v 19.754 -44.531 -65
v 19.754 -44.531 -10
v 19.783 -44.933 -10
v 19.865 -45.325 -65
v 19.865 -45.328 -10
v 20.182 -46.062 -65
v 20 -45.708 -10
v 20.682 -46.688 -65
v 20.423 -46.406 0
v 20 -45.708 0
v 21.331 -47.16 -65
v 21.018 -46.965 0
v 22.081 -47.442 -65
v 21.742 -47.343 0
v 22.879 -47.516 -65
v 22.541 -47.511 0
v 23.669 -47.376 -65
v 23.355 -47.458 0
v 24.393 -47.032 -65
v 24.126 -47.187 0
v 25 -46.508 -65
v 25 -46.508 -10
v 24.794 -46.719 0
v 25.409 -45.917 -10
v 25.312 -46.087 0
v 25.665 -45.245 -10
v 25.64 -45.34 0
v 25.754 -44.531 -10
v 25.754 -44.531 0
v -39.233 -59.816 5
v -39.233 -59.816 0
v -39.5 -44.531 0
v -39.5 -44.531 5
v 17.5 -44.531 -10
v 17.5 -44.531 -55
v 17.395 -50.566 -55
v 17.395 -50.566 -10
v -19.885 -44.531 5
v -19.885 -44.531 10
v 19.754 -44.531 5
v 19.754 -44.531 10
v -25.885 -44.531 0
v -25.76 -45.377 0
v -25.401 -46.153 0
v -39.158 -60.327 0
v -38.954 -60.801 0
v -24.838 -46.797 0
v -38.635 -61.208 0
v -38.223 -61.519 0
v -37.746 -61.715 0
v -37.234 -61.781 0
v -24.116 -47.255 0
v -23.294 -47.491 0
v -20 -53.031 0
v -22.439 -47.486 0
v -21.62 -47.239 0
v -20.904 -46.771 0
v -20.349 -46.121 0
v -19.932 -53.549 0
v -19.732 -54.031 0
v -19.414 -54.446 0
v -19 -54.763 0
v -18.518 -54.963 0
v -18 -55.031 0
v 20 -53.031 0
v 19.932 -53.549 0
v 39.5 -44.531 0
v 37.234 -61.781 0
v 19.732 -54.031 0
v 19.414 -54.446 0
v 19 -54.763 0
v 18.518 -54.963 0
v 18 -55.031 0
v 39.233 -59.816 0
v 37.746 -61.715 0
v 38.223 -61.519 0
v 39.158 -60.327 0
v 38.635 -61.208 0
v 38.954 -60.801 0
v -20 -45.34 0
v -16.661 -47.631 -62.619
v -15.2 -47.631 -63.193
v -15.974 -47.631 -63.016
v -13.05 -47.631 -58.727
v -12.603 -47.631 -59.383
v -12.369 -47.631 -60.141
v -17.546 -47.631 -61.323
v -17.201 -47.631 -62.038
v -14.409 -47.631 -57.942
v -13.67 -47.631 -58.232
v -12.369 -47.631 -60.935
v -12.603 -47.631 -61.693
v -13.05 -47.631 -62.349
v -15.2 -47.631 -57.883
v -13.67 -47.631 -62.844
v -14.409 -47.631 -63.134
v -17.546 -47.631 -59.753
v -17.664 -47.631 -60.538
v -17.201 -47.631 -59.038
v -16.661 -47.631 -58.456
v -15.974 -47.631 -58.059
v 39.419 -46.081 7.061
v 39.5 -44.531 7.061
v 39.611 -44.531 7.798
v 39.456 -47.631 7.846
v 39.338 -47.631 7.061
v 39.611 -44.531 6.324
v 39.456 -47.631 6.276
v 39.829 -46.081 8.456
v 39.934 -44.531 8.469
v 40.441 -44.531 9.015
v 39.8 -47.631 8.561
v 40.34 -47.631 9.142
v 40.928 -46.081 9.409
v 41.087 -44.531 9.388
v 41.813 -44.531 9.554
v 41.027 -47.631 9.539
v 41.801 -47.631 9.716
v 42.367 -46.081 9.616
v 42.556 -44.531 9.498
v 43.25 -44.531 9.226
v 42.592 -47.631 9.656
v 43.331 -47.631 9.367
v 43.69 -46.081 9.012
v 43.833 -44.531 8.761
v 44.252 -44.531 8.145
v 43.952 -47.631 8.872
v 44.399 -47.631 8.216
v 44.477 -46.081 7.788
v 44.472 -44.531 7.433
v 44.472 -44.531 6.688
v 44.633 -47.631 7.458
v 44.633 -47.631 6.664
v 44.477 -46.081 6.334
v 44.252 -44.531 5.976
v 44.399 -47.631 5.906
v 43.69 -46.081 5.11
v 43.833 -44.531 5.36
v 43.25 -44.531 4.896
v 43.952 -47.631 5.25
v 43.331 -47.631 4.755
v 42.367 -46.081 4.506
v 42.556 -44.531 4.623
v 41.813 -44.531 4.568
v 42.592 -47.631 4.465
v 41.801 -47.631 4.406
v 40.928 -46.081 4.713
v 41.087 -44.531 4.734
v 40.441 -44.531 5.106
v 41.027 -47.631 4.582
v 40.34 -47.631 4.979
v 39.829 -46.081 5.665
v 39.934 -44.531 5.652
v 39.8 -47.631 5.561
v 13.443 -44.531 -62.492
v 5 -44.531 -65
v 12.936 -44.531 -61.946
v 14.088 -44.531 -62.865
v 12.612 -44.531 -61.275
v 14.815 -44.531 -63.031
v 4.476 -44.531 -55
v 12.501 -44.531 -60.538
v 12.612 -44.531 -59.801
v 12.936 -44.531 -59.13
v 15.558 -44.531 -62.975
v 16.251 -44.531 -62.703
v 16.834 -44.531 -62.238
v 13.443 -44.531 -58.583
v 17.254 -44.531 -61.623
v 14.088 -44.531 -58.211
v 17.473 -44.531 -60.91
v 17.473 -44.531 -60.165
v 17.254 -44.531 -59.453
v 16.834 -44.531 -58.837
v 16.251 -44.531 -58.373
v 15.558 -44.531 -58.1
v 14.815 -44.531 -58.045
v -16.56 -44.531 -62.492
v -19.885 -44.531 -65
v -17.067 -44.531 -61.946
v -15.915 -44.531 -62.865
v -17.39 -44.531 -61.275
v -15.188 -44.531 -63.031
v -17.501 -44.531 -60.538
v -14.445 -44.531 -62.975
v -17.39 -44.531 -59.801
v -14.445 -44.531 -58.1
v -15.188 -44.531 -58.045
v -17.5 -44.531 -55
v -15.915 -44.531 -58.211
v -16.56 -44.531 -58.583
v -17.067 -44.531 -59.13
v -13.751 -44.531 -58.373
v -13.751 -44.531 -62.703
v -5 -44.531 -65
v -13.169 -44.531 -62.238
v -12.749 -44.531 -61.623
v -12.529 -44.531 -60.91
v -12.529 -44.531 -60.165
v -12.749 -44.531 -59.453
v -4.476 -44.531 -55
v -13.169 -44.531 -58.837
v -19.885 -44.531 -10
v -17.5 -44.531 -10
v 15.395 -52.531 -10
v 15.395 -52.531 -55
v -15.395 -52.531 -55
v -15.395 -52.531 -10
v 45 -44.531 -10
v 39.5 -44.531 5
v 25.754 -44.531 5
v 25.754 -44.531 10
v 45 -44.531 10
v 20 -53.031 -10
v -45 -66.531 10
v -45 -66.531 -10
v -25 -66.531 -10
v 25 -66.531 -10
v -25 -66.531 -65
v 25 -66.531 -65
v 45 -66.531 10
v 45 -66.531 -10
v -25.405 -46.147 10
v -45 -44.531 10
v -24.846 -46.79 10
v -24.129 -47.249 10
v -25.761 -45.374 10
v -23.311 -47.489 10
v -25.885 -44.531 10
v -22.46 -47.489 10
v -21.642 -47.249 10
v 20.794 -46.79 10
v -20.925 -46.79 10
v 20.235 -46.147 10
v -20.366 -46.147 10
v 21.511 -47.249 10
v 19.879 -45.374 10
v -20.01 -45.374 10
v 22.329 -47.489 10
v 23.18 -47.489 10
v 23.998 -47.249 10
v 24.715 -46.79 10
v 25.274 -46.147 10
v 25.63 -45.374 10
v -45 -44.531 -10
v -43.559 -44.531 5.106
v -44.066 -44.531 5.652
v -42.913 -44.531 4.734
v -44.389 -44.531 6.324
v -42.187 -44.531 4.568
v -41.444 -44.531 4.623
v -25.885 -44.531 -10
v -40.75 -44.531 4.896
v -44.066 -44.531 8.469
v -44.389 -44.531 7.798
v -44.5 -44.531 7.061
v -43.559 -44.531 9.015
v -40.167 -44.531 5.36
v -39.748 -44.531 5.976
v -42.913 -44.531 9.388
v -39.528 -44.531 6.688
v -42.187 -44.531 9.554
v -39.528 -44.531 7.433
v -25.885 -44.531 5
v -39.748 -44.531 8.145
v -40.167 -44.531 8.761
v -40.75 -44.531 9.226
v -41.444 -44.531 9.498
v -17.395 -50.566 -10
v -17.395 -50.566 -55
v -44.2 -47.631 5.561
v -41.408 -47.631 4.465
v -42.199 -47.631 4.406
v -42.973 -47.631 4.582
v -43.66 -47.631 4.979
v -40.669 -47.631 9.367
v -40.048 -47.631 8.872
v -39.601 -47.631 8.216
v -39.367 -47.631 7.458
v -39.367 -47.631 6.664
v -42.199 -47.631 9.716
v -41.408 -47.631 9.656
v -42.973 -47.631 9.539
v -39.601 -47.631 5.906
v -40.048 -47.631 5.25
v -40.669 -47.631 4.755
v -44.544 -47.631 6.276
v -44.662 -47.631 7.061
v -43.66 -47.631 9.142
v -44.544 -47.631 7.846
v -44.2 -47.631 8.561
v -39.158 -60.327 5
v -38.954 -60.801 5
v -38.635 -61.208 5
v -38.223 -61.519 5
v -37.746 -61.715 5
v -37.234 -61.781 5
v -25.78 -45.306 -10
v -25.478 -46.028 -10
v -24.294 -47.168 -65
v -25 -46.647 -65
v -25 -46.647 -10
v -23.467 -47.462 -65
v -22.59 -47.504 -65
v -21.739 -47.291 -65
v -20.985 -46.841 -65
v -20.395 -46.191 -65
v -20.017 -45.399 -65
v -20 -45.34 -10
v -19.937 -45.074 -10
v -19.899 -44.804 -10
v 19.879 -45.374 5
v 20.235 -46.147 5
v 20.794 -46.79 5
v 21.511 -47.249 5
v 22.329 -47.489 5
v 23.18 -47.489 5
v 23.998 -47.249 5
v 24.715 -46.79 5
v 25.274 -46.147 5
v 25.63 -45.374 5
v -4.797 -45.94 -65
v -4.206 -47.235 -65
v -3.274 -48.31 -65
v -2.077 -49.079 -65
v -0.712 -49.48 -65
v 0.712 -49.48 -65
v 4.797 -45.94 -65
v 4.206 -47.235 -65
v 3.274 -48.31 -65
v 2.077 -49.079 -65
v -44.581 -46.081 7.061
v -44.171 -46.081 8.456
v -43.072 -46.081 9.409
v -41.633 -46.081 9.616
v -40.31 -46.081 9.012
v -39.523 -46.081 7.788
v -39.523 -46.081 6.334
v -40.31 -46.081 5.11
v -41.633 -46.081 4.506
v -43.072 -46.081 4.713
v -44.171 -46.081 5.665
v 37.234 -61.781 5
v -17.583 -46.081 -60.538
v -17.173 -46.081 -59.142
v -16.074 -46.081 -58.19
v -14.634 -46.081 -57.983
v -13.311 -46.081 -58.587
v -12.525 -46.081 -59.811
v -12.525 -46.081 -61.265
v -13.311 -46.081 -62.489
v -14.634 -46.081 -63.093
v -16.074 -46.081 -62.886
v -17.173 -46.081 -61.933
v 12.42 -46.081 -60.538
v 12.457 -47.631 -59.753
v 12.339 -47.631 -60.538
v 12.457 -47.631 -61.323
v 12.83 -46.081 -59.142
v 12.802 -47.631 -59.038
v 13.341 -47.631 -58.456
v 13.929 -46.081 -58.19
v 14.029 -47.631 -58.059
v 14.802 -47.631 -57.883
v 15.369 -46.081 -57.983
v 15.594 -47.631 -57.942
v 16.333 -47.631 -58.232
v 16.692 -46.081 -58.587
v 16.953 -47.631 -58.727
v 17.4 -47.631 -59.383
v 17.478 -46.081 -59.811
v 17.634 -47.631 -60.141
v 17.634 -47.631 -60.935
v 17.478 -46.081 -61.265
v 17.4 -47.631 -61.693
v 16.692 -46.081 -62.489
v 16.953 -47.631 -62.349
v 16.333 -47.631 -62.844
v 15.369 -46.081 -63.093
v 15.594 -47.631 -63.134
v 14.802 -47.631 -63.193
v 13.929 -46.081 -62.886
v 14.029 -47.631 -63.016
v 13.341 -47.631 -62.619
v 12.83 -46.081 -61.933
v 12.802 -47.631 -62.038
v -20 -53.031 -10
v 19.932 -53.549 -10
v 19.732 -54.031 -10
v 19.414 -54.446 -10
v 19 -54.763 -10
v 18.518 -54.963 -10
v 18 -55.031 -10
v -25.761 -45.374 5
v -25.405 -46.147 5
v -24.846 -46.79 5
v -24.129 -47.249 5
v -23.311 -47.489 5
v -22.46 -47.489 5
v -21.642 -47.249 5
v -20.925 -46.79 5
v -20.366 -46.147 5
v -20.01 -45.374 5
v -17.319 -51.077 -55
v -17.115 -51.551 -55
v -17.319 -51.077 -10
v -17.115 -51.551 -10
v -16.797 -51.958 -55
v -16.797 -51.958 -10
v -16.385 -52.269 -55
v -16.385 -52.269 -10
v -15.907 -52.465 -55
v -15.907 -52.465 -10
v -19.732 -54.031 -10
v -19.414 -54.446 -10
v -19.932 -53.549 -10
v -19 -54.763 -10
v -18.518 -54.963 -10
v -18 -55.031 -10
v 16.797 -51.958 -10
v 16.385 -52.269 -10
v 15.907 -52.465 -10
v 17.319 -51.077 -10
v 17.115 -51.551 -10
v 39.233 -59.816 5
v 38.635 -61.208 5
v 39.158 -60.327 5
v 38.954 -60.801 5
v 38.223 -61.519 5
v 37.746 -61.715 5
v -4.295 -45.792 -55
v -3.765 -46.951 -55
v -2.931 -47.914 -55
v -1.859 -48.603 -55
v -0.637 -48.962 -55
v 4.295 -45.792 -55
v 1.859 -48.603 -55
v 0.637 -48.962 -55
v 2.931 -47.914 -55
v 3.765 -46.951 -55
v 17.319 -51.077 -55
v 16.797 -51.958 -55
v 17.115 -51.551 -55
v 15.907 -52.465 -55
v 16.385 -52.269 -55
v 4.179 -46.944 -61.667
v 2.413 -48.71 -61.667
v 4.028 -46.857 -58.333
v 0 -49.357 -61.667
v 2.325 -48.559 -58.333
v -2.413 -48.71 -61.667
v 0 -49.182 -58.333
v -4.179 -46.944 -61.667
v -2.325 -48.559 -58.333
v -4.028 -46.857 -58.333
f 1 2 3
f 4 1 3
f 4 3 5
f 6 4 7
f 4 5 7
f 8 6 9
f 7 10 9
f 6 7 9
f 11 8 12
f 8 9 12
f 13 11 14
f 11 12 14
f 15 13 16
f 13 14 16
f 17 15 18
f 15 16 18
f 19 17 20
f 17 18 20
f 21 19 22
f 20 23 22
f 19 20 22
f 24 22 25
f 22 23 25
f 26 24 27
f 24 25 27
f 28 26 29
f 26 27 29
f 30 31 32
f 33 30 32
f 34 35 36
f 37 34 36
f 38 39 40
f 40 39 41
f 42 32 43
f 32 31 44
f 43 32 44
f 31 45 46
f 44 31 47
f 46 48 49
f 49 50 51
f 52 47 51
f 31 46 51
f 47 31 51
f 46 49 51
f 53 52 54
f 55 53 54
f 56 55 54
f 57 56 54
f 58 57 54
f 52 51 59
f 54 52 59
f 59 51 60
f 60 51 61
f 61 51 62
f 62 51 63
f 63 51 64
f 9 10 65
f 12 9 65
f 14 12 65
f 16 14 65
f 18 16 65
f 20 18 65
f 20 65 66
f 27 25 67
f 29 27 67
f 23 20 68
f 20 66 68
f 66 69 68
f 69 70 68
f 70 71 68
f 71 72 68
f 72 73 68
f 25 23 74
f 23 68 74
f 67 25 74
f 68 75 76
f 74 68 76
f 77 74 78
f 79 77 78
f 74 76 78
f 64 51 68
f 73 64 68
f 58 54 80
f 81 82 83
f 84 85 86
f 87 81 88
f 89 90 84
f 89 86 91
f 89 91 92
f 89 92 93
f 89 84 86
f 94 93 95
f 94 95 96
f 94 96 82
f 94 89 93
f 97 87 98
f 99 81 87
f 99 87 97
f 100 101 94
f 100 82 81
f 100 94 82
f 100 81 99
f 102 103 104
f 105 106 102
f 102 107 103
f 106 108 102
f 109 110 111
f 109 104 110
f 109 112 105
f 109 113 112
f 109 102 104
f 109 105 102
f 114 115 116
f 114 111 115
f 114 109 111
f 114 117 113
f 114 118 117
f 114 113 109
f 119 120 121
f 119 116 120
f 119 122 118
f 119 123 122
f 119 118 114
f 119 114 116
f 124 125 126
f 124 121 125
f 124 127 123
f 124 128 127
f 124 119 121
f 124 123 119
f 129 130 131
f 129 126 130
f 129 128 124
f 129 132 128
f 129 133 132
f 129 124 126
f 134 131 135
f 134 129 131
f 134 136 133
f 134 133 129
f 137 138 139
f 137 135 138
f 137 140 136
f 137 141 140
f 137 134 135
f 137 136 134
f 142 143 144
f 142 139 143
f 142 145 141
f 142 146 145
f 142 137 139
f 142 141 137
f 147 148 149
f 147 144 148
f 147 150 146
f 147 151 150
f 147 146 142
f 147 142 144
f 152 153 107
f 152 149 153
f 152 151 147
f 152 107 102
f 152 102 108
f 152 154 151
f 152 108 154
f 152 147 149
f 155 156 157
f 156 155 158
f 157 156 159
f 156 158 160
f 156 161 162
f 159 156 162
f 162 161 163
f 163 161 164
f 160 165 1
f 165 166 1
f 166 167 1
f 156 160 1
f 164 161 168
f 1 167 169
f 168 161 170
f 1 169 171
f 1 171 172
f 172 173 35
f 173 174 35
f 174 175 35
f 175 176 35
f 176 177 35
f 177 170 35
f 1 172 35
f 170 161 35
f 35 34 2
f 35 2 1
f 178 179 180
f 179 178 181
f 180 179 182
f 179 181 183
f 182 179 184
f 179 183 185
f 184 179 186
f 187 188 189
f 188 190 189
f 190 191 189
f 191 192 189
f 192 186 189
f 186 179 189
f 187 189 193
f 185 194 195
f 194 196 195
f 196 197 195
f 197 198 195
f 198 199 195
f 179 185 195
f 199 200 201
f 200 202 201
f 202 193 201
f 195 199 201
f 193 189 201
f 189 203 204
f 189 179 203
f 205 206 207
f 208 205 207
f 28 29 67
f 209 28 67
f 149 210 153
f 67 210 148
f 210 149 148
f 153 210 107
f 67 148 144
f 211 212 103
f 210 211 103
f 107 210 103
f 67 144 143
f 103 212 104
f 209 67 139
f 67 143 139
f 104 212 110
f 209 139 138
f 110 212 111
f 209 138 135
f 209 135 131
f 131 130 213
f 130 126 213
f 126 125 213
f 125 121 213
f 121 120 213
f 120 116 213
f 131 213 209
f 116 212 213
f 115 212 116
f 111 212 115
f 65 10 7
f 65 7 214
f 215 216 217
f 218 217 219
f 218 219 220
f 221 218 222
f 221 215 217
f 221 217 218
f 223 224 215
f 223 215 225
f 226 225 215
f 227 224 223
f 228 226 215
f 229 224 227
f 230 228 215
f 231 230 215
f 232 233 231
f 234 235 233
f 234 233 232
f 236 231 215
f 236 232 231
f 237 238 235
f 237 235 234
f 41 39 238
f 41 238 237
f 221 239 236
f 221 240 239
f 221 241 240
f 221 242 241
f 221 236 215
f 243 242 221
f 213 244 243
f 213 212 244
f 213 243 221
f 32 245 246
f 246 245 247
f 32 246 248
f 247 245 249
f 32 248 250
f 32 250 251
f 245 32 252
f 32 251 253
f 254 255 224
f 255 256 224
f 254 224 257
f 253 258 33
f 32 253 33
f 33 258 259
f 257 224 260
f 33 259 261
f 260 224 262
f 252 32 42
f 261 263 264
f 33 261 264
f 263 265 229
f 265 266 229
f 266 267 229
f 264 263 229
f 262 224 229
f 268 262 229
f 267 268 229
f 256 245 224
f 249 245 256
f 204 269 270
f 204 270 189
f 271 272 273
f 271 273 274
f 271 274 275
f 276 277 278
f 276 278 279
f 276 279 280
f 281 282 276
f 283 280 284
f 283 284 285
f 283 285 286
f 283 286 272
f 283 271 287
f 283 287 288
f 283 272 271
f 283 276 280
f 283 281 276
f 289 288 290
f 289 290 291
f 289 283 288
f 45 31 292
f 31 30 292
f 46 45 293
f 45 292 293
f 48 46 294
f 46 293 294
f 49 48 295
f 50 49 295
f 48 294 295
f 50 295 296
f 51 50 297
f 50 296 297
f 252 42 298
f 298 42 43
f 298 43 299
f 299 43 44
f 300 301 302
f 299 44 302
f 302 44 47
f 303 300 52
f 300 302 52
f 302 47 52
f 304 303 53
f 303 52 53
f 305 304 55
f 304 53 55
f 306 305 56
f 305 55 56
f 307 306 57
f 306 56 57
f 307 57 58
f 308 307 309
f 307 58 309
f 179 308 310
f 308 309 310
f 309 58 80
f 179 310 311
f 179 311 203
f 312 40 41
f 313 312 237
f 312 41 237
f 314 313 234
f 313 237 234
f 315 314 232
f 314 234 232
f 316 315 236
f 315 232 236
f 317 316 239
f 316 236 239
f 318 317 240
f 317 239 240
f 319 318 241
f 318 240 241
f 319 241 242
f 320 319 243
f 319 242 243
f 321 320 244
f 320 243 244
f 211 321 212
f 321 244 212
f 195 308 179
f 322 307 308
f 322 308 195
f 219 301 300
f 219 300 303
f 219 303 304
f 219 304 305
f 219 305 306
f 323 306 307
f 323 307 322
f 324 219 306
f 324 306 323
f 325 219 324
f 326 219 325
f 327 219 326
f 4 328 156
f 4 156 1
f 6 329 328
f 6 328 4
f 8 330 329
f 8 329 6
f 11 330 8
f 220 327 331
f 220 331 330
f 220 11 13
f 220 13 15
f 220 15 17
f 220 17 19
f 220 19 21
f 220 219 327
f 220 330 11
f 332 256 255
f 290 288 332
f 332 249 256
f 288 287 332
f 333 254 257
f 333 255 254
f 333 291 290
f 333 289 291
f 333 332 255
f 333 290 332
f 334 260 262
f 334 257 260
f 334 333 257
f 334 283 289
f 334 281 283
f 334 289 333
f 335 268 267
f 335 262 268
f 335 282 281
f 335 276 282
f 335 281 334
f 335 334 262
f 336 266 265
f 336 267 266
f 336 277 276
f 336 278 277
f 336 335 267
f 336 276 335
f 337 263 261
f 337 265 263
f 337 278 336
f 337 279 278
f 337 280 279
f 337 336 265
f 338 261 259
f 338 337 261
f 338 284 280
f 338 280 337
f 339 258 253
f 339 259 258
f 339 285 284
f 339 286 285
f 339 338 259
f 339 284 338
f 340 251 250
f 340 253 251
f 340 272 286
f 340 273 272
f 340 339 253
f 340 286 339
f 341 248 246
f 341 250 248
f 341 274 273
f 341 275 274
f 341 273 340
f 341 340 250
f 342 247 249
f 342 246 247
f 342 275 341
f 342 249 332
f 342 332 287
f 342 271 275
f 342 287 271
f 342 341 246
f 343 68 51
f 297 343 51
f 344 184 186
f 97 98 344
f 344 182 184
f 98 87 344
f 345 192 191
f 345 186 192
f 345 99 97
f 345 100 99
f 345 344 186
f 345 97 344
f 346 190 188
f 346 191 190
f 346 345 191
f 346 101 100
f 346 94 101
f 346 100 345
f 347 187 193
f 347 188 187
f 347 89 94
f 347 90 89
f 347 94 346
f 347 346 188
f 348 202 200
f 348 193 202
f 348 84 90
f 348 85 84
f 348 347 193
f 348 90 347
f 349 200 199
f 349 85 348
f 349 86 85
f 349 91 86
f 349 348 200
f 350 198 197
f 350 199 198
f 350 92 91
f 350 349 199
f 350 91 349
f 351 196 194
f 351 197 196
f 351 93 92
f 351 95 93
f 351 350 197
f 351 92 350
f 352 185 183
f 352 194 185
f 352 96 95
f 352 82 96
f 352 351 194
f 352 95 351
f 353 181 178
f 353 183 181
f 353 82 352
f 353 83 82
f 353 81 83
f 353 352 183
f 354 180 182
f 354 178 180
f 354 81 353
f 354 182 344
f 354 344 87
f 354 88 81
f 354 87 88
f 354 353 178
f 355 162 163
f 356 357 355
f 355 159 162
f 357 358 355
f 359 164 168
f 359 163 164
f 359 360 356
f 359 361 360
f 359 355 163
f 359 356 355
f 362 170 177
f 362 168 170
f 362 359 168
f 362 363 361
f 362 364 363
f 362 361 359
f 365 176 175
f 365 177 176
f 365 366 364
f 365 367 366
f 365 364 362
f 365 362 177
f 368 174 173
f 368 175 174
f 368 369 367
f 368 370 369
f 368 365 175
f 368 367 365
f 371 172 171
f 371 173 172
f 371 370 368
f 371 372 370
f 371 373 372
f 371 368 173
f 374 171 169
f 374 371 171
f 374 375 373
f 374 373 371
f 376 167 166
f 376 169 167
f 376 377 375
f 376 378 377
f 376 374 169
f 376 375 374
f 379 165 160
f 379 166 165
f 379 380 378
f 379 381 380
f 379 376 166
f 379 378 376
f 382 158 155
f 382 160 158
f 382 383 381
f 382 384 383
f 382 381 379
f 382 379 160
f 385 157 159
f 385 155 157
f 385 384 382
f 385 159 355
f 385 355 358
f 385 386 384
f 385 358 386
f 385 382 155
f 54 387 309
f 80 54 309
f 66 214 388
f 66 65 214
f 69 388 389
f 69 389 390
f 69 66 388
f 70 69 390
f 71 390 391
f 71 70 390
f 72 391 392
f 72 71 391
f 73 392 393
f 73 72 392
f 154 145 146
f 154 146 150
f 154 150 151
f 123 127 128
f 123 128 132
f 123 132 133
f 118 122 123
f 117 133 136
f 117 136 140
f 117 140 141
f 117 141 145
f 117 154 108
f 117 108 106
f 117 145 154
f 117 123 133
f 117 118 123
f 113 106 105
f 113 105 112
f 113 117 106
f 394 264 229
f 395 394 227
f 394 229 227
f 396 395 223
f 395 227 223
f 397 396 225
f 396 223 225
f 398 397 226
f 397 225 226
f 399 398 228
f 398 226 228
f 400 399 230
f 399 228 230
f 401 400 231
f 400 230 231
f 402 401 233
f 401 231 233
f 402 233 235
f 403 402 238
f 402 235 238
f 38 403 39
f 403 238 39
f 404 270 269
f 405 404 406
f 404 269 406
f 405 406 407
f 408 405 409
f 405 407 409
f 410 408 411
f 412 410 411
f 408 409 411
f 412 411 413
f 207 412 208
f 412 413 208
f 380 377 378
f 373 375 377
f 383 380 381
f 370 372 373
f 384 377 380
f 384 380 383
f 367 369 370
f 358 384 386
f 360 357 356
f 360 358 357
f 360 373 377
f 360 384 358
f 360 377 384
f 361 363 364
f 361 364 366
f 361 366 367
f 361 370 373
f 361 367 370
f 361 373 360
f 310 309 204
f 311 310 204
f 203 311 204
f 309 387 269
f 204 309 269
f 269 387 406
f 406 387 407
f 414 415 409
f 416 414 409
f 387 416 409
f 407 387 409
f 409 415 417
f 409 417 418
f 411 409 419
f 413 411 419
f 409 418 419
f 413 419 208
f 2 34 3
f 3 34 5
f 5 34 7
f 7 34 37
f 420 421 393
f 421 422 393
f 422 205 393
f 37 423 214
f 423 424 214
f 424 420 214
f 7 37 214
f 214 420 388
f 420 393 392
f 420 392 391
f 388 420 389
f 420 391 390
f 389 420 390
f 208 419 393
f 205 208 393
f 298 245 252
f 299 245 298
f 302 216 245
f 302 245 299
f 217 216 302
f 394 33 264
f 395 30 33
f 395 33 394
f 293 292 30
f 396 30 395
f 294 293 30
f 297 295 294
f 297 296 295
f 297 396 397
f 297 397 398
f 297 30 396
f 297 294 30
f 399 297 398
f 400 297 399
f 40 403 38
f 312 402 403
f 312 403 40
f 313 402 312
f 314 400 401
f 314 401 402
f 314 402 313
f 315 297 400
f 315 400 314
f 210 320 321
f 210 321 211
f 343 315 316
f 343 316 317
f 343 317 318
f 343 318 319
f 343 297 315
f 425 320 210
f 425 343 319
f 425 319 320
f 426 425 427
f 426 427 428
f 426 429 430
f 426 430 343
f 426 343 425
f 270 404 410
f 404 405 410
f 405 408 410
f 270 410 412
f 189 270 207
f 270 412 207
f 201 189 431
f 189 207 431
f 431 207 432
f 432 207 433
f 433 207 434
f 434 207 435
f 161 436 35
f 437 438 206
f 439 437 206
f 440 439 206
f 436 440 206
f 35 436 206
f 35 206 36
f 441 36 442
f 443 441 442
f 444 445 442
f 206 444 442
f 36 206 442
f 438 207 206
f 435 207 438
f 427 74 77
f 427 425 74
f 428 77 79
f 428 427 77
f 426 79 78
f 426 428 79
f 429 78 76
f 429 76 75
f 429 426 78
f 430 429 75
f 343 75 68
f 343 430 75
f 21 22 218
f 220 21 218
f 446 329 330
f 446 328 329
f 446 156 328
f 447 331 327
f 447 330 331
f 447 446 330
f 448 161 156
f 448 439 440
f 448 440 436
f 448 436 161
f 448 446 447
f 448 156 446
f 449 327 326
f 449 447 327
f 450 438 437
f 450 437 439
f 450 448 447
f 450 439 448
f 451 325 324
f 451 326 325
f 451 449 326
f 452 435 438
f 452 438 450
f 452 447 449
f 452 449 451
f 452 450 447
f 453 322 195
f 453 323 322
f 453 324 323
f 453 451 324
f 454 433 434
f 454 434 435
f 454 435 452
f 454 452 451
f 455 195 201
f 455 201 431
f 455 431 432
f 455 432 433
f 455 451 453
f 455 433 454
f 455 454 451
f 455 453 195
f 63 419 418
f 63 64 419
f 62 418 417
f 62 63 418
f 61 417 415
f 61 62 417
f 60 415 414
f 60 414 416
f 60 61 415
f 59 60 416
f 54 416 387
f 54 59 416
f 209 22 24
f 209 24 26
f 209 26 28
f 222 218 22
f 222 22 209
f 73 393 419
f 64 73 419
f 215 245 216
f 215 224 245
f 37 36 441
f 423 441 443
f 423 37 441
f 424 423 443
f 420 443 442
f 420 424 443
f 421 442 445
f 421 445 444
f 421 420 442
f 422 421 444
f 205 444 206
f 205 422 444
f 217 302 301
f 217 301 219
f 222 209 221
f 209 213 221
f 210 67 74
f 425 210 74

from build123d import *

# Parameters (mm, degrees)
F0_W      = 90
F0_H      = 22
F1_DEPTH  = 10
F3_DEPTH  = 5
F4_R      = 2
F5_W      = 90
F5_H      = 22
F6_DEPTH  = 10
F8_DEPTH  = 10
F9_R      = 2
F11_DEPTH = 45
F13_DEPTH = 45
F14_R     = 2
F15_W     = 50
F15_H     = 22
F16_DEPTH = 10
F17_R     = 5
F18_DEPTH = 25
F18_TAPER = 3
F20_R     = 3
F21_DEPTH = 90
F22_R     = 2.5
F23_DEPTH = 3.1
F23_TAPER = -3
F24_R     = 2.5
F25_DEPTH = 3.1
F25_TAPER = -3


with BuildPart() as f1:
    # F0 (on Top) → F1 (new body)
    with BuildSketch(Plane.XY):
        with Locations((0, -55.5313304067)):
            Rectangle(F0_W, F0_H)
    extrude(amount=F1_DEPTH)

    # F2 (on face) → F3 (cut)
    with BuildSketch(Plane(origin=(0, 0, 0), x_dir=(1, 0, 0), z_dir=(0, 0, -1))):
        Polygon((-39.5, 44.5313304067), (0, 44.5313304067), (39.5, 44.5313304067), (39.19890013, 61.7813304067), (-39.19890013, 61.7813304067), align=None)
    extrude(amount=-F3_DEPTH, mode=Mode.SUBTRACT)

    # F4
    f4_edges = [f1.edges().sort_by_distance(p)[0] for p in [
        (-39.1989, -61.78133, 2.5),
        (39.1989, -61.78133, 2.5),
    ]]
    fillet(f4_edges, radius=F4_R)

    # F5 (on face) → F6 (join)
    with BuildSketch(Plane(origin=(0, 0, 0), x_dir=(1, 0, 0), z_dir=(0, 0, -1))):
        with Locations((0, 55.5313304067)):
            Rectangle(F5_W, F5_H)
    extrude(amount=F6_DEPTH)

    # F7 (on face) → F8 (cut)
    with BuildSketch(Plane(origin=(0, 0, -10), x_dir=(1, 0, 0), z_dir=(0, 0, -1))):
        Polygon((-20, 44.5313304067), (0, 44.5313304067), (20, 44.5313304067), (19.8167218183, 55.0313304067), (-19.8167218183, 55.0313304067), align=None)
        Polygon((19.8167218183, 55.0313304067), (20, 44.5313304067), (20, 55.0313304067), align=None)
        Polygon((-20, 55.0313304067), (-20, 44.5313304067), (-19.8167218183, 55.0313304067), align=None)
    extrude(amount=-F8_DEPTH, mode=Mode.SUBTRACT)

    # F9
    f9_edges = [f1.edges().sort_by_distance(p)[0] for p in [
        (-20, -55.03133, -5),
        (20, -55.03133, -5),
    ]]
    fillet(f9_edges, radius=F9_R)

    # F10 (on face) → F11 (join)
    with BuildSketch(Plane(origin=(0, 0, -10), x_dir=(1, 0, 0), z_dir=(0, 0, -1))):
        Polygon((-25, 44.5313304067), (0, 44.5313304067), (25, 44.5313304067), (25, 66.5313304067), (-25, 66.5313304067), align=None)
    extrude(amount=F11_DEPTH)

    # F12 (on face) → F13 (cut)
    with BuildSketch(Plane(origin=(0, 0, -55), x_dir=(1, 0, 0), z_dir=(0, 0, -1))):
        Polygon((-17.5, 44.5313304067), (0, 44.5313304067), (17.5, 44.5313304067), (17.3603594806, 52.5313304067), (-17.3603594806, 52.5313304067), align=None)
    extrude(amount=-F13_DEPTH, mode=Mode.SUBTRACT)

    # F14
    f14_edges = [f1.edges().sort_by_distance(p)[0] for p in [
        (-17.360359, -52.53133, -32.5),
        (17.360359, -52.53133, -32.5),
    ]]
    fillet(f14_edges, radius=F14_R)

    # F15 (on face) → F16 (join)
    with BuildSketch(Plane(origin=(0, 0, -55), x_dir=(1, 0, 0), z_dir=(0, 0, -1))):
        with Locations((0, 55.5313304067)):
            Rectangle(F15_W, F15_H)
    extrude(amount=F16_DEPTH)

    # F17 (on face) → F18 (cut)
    with BuildSketch(Plane(origin=(0, 0, -65), x_dir=(1, 0, 0), z_dir=(0, 0, -1))):
        with Locations((0, 44.5313304067)):
            Circle(F17_R)
    extrude(amount=-F18_DEPTH, taper=F18_TAPER, mode=Mode.SUBTRACT)

    # F20 (on face) → F21 (cut)
    with BuildSketch(Plane.XY.offset(10)):
        with Locations((22.7543748915, -44.5189550519)):
            Circle(F20_R)
        with Locations((-22.8854361922, -44.5189550519)):
            Circle(F20_R)
    extrude(amount=-F21_DEPTH, mode=Mode.SUBTRACT)

    # F22 (on face) → F23 (cut)
    with BuildSketch(Plane(origin=(0, -44.5313304067, 0), x_dir=(-1, 0, 0), z_dir=(0, 1, 0))):
        with Locations((-15.0013593957, -60.537815094)):
            Circle(F22_R)
        with Locations((15.0013593957, -60.537815094)):
            Circle(F22_R)
    extrude(amount=-F23_DEPTH, taper=F23_TAPER, mode=Mode.SUBTRACT)

    # F24 (on face) → F25 (cut)
    with BuildSketch(Plane(origin=(0, -44.5313304067, 0), x_dir=(-1, 0, 0), z_dir=(0, 1, 0))):
        with Locations((-42, 7.0607517846)):
            Circle(F24_R)
        with Locations((42, 7.0607517846)):
            Circle(F24_R)
    extrude(amount=-F25_DEPTH, taper=F25_TAPER, mode=Mode.SUBTRACT)


solid = f1.part
